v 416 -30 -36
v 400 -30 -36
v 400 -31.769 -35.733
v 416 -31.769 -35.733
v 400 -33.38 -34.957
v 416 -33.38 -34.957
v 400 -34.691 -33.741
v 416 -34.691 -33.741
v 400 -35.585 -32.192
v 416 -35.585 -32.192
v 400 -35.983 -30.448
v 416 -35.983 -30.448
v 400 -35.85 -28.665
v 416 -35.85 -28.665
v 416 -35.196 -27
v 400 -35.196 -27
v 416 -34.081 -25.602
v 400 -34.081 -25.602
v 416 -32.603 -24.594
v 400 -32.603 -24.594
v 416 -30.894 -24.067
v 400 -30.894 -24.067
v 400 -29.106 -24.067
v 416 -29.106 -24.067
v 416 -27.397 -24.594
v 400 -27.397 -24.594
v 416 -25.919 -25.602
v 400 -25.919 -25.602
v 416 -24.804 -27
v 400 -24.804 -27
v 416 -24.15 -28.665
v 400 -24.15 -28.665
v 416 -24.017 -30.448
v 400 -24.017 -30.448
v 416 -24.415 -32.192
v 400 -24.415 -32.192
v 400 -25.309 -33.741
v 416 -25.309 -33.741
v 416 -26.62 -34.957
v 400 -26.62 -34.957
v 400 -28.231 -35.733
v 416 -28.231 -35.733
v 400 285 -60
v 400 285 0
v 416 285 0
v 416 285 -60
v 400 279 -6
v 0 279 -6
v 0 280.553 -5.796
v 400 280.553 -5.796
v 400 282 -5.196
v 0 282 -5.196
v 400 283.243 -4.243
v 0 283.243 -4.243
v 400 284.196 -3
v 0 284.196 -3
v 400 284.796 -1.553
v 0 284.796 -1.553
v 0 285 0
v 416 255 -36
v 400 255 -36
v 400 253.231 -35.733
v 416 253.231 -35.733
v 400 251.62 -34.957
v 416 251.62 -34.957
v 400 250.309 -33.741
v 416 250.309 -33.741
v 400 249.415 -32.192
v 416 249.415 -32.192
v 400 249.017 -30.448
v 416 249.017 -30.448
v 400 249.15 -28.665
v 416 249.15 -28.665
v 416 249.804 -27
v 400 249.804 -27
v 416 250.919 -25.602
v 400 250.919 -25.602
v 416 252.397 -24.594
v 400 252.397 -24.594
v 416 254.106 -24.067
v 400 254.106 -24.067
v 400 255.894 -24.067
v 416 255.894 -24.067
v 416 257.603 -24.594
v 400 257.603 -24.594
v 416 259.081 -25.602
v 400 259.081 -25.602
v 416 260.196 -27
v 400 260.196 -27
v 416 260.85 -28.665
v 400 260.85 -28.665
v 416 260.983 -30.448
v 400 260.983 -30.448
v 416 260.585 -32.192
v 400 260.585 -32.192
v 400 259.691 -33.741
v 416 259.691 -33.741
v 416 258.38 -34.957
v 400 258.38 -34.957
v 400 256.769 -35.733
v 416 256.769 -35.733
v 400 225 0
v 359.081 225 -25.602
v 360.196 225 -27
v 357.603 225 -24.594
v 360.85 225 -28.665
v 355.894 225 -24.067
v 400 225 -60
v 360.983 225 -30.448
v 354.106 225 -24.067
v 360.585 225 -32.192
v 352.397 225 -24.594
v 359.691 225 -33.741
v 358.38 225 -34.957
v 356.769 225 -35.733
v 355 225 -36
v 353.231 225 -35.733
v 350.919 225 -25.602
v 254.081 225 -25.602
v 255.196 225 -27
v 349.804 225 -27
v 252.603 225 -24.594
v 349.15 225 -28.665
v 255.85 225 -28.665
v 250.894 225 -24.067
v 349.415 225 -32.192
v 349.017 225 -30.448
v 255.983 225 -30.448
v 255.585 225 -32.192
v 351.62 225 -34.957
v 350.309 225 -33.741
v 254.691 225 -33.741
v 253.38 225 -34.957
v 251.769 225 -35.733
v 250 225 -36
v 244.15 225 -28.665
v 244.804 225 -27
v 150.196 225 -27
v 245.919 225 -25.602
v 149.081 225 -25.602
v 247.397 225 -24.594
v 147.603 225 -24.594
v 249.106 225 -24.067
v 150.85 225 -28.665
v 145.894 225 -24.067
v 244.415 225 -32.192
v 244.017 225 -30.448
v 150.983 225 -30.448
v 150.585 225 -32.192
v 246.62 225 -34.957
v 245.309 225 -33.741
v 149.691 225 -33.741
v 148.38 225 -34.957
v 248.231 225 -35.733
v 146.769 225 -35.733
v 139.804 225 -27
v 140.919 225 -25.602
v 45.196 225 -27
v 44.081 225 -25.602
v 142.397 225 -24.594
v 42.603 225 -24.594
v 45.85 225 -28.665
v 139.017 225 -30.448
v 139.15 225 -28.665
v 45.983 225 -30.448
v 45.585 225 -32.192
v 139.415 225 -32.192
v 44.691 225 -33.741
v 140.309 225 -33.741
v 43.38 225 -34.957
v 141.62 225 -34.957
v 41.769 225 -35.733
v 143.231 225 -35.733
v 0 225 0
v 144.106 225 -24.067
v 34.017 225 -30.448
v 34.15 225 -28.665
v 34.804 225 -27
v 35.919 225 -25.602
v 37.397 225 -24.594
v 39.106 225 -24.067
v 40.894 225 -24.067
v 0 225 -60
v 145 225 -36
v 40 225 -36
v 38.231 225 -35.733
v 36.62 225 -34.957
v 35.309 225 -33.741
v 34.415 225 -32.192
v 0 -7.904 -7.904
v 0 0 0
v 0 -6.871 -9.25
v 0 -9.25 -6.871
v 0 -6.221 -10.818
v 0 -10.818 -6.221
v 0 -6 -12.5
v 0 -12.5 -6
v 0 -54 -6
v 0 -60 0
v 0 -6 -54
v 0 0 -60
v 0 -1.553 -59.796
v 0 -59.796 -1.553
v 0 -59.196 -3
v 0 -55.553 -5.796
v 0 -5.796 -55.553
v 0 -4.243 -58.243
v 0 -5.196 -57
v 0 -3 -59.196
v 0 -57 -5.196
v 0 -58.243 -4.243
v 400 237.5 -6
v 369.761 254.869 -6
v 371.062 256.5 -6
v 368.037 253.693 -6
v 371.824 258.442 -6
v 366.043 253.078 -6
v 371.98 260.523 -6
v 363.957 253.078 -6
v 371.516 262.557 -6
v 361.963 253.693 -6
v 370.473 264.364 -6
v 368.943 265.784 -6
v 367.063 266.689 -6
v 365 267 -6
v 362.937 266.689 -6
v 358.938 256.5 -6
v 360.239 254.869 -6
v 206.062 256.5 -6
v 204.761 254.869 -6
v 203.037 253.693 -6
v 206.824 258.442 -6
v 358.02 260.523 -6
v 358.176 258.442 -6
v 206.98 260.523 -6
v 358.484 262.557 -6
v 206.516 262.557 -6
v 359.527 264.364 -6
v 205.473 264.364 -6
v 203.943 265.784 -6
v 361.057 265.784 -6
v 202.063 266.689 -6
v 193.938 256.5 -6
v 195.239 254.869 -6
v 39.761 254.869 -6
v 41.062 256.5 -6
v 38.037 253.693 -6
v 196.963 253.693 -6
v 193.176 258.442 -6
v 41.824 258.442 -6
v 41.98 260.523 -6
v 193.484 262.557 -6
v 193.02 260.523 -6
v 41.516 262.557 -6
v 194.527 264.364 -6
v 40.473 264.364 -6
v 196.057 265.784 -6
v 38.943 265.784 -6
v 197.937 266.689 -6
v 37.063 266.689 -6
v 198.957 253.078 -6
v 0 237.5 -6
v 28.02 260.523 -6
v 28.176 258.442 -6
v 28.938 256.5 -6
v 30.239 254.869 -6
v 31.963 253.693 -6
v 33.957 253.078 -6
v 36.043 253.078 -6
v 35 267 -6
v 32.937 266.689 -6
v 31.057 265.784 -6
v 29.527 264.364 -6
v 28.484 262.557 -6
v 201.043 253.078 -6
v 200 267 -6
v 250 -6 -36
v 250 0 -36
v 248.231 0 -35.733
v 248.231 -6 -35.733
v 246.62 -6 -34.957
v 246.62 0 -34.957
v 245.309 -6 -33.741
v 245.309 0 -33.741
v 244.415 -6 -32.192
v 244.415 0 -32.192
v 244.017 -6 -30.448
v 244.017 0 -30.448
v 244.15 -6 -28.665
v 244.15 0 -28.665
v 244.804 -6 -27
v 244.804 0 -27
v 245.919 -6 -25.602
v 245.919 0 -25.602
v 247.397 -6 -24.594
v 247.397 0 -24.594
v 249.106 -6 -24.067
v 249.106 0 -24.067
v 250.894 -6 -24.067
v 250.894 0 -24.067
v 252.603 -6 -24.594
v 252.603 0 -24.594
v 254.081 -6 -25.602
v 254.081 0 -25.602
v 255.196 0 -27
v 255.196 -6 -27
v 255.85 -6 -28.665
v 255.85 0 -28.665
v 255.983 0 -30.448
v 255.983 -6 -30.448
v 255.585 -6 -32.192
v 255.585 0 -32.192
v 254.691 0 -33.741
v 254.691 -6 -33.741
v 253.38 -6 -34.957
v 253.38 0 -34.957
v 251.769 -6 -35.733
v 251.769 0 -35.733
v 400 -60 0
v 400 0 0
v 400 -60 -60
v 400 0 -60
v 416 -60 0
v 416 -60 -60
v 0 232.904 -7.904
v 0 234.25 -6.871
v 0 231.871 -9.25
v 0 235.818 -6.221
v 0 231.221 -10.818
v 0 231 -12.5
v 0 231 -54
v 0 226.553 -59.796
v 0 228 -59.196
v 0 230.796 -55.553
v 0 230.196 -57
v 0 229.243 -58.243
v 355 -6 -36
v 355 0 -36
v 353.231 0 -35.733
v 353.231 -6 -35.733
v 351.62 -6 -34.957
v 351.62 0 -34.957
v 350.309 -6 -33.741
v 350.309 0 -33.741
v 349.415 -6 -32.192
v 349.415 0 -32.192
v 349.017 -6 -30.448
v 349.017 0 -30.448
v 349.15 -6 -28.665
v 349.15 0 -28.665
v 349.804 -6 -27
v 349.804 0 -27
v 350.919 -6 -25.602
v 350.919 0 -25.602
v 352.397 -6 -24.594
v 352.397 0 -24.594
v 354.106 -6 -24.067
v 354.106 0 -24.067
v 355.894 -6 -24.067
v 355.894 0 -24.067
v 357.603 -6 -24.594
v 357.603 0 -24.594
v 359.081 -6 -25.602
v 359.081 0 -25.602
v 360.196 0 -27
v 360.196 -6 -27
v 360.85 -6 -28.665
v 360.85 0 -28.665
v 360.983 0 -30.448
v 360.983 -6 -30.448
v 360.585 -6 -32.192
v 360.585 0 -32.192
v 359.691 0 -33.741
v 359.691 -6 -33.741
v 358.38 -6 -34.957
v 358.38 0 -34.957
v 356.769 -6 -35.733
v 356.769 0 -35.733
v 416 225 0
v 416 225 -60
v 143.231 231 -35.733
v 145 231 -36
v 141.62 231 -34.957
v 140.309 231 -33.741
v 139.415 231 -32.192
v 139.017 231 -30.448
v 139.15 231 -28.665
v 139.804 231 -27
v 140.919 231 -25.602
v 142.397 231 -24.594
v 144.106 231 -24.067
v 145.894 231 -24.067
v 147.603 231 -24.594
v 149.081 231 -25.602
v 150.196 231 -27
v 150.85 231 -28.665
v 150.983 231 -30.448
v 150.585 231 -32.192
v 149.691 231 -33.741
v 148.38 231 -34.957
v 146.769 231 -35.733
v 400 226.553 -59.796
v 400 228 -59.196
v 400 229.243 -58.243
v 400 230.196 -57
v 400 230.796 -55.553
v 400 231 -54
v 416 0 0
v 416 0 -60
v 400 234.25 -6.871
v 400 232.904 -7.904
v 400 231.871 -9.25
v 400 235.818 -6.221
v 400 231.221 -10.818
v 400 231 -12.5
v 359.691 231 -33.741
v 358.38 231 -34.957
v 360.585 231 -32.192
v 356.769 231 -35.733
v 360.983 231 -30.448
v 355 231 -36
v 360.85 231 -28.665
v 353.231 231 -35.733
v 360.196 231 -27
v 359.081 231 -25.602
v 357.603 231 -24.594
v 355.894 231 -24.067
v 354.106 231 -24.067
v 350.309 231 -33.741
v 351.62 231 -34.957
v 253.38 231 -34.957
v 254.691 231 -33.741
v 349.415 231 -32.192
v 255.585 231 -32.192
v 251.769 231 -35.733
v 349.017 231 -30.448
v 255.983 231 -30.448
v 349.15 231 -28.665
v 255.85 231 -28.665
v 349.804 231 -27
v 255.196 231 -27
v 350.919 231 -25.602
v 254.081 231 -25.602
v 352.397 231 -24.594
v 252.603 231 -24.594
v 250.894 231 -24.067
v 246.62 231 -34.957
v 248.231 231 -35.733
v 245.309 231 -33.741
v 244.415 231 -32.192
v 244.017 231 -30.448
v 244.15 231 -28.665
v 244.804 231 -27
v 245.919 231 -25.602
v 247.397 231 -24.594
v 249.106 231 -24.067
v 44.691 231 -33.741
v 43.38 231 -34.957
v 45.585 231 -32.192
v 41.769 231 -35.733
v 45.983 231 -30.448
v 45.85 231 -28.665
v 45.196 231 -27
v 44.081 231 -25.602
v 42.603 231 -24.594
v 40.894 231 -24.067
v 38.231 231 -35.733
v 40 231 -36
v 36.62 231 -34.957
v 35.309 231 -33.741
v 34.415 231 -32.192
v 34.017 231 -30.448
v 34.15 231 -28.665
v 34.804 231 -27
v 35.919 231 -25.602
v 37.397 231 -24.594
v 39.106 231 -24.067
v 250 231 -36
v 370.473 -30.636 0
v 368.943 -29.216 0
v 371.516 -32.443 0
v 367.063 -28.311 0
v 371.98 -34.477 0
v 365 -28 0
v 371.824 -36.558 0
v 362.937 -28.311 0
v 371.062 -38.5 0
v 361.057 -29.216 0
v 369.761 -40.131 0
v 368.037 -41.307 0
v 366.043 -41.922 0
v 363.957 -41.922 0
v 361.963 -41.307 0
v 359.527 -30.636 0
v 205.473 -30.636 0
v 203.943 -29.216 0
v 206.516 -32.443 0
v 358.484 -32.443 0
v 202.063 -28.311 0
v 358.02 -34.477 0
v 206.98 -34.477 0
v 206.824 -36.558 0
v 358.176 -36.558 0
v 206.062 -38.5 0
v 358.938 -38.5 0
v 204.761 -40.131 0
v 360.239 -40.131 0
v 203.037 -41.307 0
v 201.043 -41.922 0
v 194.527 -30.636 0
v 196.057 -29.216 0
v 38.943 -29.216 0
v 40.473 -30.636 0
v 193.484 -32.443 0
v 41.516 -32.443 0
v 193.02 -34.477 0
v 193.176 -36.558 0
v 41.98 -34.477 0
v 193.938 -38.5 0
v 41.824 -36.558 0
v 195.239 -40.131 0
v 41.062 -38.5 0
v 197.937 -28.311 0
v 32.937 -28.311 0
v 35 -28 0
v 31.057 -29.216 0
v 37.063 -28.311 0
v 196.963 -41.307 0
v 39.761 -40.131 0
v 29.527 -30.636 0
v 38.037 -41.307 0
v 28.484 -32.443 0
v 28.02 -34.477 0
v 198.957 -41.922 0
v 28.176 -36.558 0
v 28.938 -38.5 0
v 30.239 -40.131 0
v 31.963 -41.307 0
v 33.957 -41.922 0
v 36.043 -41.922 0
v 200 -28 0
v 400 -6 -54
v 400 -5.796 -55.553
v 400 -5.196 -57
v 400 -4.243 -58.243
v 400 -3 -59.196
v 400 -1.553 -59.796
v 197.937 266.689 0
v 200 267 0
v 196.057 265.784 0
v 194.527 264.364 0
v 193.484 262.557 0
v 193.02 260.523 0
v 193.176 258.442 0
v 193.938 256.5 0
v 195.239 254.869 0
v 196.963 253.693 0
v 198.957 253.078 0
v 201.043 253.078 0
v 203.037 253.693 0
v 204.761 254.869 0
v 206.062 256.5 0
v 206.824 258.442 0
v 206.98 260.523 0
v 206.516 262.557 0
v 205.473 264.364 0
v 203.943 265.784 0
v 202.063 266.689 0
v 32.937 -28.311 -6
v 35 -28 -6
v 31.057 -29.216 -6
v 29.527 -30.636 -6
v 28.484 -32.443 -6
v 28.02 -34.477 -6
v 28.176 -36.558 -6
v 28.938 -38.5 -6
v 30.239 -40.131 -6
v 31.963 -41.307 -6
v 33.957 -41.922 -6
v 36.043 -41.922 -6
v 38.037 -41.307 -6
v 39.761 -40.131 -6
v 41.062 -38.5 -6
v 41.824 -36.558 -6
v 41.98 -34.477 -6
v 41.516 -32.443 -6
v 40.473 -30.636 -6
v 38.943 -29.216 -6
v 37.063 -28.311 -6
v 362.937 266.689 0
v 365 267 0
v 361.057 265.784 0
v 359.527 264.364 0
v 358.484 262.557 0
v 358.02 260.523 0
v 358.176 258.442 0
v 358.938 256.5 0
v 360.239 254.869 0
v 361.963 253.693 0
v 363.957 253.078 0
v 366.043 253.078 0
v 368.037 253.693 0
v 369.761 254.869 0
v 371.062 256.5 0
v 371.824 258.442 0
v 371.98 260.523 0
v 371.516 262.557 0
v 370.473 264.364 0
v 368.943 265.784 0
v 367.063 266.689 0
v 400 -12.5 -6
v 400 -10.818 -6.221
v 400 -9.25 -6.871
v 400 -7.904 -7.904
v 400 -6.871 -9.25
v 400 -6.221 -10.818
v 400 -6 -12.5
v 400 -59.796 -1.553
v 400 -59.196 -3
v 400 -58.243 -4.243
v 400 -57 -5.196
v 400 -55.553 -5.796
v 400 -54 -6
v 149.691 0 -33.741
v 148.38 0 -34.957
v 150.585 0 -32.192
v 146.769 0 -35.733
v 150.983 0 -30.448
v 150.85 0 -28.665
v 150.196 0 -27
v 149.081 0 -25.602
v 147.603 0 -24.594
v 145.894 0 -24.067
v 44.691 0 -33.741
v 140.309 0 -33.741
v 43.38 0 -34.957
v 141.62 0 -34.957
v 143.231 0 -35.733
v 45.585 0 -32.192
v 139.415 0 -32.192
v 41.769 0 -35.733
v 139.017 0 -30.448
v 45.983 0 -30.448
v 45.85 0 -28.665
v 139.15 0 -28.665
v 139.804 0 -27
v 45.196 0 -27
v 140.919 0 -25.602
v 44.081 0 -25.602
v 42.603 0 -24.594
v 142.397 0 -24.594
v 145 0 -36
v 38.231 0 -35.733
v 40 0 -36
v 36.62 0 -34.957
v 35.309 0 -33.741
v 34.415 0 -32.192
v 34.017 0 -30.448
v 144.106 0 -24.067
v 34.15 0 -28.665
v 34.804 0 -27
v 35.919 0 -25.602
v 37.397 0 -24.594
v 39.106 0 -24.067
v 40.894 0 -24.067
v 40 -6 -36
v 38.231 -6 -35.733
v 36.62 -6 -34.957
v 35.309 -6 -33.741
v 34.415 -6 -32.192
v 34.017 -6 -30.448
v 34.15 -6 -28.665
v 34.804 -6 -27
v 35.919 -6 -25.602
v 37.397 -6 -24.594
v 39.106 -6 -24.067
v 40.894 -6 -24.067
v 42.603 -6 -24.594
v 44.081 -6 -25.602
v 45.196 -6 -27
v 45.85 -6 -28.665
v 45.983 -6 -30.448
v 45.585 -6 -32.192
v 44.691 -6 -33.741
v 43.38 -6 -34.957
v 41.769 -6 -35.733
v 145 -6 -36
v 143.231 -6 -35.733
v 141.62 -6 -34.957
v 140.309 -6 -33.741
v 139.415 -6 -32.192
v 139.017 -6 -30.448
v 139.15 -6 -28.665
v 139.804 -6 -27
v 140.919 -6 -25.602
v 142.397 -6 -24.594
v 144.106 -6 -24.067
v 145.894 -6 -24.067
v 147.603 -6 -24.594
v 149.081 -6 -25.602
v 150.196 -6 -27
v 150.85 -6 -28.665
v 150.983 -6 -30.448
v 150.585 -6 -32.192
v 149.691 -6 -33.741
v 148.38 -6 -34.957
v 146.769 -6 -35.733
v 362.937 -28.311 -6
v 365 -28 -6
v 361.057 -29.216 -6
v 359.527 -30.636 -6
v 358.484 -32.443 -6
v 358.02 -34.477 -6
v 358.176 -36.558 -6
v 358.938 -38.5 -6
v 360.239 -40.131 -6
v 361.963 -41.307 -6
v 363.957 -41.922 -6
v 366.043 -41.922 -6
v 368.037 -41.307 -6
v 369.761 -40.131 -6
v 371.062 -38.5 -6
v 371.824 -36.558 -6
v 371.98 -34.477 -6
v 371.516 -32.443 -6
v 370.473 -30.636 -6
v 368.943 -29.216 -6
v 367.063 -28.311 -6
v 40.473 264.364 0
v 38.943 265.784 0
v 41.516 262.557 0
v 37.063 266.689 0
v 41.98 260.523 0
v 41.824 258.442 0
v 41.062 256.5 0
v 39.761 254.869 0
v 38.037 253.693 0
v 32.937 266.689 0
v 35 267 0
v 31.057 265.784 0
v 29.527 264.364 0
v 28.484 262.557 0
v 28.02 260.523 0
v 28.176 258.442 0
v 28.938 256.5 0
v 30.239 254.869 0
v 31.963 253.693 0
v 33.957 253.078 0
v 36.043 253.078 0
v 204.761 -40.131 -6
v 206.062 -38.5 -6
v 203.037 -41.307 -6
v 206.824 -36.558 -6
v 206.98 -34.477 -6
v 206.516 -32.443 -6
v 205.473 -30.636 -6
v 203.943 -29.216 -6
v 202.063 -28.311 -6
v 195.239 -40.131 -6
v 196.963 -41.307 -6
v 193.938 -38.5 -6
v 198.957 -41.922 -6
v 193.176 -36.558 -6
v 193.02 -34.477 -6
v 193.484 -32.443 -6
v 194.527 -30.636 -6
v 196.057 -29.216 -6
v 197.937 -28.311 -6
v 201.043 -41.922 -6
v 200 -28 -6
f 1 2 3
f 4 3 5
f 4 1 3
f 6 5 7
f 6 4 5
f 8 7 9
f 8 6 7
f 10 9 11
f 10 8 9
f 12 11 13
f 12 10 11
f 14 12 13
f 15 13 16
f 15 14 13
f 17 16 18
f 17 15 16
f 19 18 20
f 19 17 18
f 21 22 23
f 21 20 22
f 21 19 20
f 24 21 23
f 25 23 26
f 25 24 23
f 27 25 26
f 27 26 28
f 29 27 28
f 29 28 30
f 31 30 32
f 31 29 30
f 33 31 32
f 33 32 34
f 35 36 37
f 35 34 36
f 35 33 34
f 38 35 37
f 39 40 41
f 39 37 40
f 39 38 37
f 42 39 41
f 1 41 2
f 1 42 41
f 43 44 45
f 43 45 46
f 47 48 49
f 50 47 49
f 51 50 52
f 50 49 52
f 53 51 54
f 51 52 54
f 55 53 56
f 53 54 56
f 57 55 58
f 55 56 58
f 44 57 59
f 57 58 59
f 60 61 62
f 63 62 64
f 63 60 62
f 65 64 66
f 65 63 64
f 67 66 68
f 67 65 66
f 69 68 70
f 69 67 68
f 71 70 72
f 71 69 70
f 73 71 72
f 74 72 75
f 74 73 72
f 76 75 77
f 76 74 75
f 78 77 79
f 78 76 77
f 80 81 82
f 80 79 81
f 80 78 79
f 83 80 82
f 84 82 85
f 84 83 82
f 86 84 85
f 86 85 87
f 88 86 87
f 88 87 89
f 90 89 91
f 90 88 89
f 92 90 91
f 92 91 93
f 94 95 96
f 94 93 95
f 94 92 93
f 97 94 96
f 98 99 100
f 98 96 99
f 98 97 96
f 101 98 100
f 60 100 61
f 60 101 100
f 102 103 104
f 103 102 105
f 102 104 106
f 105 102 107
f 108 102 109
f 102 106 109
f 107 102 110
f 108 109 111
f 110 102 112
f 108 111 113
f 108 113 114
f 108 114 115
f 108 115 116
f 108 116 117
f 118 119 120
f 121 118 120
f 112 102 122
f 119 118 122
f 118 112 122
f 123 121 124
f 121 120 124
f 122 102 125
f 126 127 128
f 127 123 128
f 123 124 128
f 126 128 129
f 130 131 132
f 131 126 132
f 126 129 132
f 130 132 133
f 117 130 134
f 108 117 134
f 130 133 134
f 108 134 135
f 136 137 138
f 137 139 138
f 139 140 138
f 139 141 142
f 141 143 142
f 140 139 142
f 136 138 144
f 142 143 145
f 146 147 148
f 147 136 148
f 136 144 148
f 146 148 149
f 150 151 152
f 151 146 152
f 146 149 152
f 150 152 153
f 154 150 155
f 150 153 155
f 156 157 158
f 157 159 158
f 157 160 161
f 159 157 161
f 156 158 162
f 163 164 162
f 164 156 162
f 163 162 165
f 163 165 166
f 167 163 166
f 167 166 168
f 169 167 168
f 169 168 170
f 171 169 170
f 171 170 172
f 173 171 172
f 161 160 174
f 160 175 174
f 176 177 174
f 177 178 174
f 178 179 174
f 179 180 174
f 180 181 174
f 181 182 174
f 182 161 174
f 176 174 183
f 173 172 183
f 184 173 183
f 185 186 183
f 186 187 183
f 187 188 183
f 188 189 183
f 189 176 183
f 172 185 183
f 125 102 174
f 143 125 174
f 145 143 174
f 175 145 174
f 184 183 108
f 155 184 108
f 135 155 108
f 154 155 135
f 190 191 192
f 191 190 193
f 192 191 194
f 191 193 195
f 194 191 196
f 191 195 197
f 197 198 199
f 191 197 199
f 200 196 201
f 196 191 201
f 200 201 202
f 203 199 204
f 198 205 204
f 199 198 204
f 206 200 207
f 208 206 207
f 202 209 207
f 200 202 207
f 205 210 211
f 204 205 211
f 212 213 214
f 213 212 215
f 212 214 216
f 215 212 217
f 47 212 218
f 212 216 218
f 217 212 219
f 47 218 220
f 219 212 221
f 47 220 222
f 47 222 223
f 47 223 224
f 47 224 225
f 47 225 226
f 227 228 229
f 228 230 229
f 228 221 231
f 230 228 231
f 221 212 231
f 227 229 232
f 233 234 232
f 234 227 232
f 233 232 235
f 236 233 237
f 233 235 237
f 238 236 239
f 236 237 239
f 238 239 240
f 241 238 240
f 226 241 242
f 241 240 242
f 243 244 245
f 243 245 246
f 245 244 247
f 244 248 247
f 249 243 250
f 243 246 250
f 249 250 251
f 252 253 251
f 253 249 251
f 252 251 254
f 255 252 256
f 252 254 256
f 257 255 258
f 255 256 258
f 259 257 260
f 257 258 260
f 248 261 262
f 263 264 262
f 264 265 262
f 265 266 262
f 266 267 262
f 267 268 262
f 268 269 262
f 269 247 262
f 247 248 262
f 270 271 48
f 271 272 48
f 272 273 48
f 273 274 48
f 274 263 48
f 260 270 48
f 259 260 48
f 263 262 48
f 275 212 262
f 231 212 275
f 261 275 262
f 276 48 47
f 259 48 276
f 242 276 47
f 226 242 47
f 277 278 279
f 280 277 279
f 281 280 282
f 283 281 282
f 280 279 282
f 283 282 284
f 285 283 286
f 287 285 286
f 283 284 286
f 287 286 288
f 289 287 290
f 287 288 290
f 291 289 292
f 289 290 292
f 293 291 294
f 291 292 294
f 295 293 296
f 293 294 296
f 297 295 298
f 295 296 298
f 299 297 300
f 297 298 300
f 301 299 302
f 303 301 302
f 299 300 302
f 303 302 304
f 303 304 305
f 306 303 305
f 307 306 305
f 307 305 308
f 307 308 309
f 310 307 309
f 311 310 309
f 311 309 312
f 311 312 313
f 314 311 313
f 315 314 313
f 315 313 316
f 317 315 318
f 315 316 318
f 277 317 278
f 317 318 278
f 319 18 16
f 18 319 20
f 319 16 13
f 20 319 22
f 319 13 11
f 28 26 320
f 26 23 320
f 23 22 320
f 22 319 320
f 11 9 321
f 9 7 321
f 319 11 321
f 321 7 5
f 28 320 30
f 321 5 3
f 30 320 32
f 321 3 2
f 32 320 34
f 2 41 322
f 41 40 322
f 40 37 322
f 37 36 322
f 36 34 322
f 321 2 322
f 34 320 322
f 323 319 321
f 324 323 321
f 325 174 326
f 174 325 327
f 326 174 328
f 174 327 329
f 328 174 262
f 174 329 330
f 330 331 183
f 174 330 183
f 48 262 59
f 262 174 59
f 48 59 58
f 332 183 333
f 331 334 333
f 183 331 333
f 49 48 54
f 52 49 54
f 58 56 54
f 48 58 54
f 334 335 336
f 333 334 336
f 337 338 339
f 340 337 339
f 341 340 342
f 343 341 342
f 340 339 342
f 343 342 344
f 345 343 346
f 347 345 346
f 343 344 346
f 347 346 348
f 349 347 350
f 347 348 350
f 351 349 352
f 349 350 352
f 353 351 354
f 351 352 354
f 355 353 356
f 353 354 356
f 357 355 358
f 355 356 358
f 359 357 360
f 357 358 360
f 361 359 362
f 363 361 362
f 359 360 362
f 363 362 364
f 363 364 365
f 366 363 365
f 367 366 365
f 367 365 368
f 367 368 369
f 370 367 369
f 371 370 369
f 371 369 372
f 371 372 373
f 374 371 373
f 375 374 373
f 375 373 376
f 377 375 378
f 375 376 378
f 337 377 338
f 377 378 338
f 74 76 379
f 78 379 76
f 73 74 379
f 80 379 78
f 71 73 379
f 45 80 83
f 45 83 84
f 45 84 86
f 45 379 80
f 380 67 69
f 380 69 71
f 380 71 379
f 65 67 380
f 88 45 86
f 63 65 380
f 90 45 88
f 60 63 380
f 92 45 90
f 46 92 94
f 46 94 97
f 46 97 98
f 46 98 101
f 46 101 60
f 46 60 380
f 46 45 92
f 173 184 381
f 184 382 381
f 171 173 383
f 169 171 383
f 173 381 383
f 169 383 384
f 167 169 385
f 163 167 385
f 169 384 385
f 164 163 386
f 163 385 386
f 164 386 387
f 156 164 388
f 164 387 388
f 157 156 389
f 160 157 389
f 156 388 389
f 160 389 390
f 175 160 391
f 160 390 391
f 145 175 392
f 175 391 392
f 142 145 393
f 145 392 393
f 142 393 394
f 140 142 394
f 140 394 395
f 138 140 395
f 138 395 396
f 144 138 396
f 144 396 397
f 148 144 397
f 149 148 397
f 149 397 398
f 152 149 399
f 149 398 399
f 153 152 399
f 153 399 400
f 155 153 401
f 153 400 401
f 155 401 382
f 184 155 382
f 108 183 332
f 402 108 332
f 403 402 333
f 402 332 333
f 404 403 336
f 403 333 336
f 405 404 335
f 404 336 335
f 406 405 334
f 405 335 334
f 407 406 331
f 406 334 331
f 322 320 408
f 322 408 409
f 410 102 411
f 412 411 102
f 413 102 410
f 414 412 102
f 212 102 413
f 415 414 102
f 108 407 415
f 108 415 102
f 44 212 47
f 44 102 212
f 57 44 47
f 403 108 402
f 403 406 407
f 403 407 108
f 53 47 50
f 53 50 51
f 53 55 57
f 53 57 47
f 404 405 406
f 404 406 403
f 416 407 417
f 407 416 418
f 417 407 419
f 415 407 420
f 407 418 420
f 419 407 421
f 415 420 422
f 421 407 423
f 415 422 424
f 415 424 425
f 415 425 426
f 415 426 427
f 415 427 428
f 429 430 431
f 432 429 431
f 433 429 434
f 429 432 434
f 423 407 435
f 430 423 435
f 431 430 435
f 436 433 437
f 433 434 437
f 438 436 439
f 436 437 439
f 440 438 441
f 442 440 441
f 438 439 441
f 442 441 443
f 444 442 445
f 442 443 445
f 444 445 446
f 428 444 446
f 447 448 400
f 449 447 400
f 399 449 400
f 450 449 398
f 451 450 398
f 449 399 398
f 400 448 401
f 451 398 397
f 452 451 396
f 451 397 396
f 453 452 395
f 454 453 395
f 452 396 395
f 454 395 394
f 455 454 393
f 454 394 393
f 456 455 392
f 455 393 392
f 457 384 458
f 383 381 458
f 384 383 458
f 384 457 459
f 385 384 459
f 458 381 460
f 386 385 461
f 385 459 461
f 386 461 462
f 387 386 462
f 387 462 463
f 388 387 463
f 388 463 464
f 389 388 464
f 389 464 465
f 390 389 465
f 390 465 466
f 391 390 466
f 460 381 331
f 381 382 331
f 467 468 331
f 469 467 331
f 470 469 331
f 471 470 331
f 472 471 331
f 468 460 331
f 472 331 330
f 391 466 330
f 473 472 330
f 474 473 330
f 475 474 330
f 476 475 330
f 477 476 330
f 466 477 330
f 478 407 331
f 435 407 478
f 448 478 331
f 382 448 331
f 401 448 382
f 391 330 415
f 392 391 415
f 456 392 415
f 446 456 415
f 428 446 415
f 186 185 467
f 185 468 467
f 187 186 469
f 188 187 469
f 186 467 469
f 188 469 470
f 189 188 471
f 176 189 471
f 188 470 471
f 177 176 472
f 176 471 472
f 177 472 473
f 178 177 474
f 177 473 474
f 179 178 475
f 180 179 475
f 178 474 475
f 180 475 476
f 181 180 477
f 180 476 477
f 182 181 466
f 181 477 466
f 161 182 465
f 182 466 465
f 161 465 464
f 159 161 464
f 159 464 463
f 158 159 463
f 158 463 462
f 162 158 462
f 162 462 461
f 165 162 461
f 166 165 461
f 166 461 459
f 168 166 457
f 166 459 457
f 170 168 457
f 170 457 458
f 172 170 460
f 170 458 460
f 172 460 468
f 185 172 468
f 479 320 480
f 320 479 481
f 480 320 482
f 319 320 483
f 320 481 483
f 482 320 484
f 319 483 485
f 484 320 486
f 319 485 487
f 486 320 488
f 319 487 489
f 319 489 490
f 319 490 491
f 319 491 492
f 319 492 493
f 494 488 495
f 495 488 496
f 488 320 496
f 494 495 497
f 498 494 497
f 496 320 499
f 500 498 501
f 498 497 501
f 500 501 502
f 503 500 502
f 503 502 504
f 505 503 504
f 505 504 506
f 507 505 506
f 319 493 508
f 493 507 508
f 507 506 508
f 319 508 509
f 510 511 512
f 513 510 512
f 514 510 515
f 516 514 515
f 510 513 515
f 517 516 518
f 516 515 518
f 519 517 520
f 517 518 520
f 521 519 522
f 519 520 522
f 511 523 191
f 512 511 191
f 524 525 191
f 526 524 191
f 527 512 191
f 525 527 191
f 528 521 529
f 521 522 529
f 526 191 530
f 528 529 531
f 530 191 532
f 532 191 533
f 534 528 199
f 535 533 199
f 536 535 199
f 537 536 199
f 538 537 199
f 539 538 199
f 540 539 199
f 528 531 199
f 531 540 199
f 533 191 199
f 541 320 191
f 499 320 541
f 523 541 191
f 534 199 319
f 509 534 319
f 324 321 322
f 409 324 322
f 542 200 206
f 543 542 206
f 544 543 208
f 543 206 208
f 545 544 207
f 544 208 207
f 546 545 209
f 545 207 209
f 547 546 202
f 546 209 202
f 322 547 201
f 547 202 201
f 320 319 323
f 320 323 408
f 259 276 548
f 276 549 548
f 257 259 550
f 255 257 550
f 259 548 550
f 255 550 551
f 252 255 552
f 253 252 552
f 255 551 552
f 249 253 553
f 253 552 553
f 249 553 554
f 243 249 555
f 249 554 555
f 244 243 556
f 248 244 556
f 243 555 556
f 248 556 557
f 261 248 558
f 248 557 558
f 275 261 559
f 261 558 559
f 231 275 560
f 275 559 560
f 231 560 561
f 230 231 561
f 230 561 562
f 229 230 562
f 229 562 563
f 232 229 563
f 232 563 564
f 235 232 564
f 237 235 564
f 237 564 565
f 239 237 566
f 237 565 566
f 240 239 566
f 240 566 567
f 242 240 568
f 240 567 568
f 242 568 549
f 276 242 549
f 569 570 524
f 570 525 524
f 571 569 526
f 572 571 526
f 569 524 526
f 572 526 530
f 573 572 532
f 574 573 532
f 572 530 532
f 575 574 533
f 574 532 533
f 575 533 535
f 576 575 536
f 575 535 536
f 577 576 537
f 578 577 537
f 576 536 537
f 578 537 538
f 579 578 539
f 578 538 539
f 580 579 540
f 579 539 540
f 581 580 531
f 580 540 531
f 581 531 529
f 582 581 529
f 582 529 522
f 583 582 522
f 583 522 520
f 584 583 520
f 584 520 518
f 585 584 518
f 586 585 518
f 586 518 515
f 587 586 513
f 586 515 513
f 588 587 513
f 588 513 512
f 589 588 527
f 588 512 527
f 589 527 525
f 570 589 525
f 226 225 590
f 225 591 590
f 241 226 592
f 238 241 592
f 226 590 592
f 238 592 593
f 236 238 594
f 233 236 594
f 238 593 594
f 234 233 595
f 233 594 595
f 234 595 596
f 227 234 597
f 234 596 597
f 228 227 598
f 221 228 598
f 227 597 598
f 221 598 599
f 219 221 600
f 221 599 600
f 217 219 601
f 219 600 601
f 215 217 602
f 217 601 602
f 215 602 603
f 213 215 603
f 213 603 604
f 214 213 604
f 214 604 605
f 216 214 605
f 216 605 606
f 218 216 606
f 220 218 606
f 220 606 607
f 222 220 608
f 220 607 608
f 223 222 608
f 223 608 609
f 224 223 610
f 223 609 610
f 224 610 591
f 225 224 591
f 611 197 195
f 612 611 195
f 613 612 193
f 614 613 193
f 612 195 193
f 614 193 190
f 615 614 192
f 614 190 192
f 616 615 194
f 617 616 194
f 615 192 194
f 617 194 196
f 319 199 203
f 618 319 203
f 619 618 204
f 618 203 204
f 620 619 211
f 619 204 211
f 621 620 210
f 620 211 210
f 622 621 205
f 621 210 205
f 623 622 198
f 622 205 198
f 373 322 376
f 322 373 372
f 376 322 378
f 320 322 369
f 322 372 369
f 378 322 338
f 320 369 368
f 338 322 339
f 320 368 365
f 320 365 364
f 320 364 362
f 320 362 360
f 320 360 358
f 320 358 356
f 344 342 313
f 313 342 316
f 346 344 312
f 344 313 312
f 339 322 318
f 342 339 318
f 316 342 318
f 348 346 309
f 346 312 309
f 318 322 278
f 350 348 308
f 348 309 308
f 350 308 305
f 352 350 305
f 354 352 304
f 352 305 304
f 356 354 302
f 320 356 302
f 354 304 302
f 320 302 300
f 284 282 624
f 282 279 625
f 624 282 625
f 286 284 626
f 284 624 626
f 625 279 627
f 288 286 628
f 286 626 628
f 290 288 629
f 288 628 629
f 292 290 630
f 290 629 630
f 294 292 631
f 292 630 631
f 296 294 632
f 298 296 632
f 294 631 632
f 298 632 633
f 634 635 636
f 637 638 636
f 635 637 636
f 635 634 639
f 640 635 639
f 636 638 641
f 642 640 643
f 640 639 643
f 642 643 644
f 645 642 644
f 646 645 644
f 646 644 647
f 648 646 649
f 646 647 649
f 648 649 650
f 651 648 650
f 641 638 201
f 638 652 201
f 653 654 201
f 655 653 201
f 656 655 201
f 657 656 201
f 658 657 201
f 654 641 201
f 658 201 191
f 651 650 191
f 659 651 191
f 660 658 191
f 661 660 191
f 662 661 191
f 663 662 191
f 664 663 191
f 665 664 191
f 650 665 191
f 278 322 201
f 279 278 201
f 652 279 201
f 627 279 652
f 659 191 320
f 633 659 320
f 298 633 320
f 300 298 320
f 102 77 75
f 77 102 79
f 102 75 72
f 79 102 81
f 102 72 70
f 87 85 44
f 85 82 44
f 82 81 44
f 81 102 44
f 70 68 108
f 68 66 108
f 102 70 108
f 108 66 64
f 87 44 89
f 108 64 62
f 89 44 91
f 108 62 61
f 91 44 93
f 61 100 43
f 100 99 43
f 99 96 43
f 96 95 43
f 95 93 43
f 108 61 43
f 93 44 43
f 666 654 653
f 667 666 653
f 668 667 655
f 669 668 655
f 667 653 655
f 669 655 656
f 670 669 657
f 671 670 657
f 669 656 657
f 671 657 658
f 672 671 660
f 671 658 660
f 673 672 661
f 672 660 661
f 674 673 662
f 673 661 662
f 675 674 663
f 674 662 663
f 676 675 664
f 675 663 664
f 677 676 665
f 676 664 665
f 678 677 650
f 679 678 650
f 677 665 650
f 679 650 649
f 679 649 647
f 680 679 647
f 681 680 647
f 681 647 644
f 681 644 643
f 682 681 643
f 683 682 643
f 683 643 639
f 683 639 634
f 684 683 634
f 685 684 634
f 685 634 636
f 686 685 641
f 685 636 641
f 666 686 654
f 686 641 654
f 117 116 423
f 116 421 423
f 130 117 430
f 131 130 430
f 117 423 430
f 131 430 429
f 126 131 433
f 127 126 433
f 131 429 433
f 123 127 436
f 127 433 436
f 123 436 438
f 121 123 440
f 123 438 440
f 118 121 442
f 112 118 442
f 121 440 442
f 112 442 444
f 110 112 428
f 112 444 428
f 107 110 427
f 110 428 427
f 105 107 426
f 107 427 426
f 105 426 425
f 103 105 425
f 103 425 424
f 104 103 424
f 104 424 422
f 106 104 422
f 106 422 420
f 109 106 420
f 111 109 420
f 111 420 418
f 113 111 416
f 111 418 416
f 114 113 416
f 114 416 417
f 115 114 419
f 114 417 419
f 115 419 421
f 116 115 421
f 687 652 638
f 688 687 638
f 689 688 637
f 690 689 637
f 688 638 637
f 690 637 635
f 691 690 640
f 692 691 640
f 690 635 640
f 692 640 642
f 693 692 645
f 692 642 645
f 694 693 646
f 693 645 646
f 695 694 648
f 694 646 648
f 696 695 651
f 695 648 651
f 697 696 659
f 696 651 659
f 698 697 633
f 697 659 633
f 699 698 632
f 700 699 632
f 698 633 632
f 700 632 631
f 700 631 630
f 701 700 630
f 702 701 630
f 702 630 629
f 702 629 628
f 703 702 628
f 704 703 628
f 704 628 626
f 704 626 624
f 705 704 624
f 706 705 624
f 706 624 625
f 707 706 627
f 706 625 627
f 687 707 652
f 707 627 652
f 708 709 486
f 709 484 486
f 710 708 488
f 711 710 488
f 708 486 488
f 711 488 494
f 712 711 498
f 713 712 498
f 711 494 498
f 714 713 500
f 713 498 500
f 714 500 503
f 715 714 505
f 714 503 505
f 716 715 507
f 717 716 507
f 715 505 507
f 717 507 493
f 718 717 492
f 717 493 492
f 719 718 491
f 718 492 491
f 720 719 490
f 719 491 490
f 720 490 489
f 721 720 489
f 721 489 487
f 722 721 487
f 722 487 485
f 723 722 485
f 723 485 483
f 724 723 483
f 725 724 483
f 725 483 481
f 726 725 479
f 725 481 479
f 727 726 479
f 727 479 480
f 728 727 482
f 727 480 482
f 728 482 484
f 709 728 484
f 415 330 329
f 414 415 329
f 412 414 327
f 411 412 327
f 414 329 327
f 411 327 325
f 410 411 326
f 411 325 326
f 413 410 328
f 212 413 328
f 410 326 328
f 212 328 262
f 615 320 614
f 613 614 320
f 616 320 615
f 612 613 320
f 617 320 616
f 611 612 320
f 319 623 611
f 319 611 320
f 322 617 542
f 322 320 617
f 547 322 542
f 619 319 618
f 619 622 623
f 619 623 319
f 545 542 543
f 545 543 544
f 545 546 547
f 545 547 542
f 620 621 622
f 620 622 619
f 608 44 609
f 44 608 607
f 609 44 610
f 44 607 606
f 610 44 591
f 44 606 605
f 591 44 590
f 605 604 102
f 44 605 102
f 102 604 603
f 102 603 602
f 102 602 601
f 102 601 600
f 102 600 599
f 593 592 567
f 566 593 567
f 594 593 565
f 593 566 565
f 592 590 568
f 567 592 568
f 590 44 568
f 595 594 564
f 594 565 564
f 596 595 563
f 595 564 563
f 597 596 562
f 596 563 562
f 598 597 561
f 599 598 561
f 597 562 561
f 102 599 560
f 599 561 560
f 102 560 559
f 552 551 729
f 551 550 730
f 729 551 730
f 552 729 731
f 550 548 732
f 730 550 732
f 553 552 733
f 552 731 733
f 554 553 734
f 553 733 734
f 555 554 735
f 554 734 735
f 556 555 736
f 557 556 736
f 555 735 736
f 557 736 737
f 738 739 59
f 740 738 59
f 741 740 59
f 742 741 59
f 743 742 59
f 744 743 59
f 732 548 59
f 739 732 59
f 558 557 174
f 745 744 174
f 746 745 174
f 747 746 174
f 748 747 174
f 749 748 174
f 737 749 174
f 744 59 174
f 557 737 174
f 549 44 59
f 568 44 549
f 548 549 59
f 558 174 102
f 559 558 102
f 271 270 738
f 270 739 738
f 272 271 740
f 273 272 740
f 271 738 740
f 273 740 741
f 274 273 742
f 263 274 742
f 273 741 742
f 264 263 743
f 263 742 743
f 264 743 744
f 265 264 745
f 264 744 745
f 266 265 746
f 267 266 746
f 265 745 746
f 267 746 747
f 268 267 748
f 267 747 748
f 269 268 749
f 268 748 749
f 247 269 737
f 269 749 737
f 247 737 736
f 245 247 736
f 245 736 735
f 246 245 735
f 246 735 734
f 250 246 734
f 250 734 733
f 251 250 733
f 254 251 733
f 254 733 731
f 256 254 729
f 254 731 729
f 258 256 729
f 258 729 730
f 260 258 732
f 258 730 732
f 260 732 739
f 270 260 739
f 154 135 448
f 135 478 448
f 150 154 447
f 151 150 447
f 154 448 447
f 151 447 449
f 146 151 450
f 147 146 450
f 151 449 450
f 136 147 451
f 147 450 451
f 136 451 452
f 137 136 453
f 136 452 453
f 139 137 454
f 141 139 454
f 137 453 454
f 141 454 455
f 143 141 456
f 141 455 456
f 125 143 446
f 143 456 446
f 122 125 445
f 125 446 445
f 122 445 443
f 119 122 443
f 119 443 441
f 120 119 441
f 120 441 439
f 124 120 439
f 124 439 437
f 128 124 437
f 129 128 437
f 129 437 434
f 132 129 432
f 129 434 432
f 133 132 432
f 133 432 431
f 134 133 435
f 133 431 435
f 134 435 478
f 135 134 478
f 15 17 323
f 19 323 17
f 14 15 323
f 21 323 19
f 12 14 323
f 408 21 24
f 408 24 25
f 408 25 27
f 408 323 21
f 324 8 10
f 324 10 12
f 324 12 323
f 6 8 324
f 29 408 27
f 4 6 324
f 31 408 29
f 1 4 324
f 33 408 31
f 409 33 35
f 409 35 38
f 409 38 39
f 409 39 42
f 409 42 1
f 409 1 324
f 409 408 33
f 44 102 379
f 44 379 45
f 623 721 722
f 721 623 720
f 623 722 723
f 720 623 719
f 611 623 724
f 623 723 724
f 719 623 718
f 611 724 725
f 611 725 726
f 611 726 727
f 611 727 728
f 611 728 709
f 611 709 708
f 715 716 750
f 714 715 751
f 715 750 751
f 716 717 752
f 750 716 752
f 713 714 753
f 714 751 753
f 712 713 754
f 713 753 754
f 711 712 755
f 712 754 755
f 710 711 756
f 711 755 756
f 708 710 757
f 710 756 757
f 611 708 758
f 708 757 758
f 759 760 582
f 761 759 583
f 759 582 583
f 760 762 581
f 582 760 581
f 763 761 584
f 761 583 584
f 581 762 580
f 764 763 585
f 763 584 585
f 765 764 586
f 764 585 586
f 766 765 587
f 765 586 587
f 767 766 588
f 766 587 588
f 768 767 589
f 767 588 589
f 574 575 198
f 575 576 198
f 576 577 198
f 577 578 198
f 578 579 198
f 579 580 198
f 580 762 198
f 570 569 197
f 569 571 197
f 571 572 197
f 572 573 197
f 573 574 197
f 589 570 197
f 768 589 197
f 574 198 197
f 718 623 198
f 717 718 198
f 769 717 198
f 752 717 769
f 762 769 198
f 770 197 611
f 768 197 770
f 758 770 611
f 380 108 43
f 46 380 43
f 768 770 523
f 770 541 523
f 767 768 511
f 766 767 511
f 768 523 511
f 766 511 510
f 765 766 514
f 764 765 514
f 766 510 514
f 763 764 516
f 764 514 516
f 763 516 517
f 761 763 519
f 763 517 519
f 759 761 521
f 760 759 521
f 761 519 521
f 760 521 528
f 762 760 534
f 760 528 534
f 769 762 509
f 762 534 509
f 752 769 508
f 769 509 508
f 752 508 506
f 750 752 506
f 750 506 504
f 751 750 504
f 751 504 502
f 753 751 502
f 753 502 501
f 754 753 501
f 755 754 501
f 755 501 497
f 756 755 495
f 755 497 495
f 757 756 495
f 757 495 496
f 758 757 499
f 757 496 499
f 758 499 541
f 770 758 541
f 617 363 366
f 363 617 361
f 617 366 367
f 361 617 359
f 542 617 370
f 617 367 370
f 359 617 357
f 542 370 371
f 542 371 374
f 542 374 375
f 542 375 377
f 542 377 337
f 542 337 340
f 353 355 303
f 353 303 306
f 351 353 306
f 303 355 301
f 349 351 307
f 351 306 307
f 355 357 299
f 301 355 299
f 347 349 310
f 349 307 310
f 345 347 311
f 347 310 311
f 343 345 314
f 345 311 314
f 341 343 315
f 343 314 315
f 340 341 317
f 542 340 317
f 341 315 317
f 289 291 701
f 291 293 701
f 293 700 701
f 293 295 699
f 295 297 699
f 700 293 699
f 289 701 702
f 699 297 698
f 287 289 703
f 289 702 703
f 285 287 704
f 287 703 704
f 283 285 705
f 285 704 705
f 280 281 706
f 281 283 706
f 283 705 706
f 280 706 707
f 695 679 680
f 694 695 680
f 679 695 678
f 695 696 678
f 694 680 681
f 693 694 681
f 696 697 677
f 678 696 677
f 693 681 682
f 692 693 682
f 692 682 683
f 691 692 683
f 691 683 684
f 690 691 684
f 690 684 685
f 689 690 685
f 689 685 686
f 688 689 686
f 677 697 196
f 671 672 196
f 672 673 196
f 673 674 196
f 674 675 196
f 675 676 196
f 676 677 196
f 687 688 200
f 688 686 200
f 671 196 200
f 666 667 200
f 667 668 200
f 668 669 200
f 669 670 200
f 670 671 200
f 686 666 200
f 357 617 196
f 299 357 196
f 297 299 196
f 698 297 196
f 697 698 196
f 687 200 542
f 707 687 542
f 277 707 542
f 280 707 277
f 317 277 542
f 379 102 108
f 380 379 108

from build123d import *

# Parameters (mm, degrees)
GBT_706_2008_60_60_6_1_DEPTH     = 400
GBT_706_2008_60_60_6_2_DEPTH     = 400
GBT_706_2008_60_60_6_3_DEPTH     = 225
SKETCH_8_W                       = 60
SKETCH_8_H                       = 60
EXTRUDE_2_DEPTH                  = 16
EXTRUDE_2_2_DEPTH                = 16
HOLE_WIZARD_M14_2_AT_2_COUNT     = 2
HOLE_WIZARD_M14_2_AT_2_PITCH     = 285
SKETCH_12_W                      = 6
SKETCH_12_H                      = 291
HOLE_WIZARD_12_0_12_1_AT_2_COUNT = 2
HOLE_WIZARD_12_0_12_1_AT_2_PITCH = 105
HOLE_WIZARD_12_0_12_1_AT_3_COUNT = 2
HOLE_WIZARD_12_0_12_1_AT_3_PITCH = 210
HOLE_WIZARD_12_0_12_1_AT_4_COUNT = 2
HOLE_WIZARD_12_0_12_1_AT_4_PITCH = 315
SKETCH_14_W                      = 7
SKETCH_14_H                      = 6
HOLE_WIZARD_14_0_14_1_AT_2_COUNT = 2
HOLE_WIZARD_14_0_14_1_AT_2_PITCH = 165
HOLE_WIZARD_14_0_14_1_AT_3_COUNT = 2
HOLE_WIZARD_14_0_14_1_AT_3_PITCH = 330
HOLE_WIZARD_14_0_14_1_AT_4_COUNT = 2
HOLE_WIZARD_14_0_14_1_AT_4_PITCH = 295
HOLE_WIZARD_14_0_14_1_AT_5_COUNT = 2
HOLE_WIZARD_14_0_14_1_AT_5_PITCH = 338.008875623
HOLE_WIZARD_14_0_14_1_AT_6_COUNT = 2
HOLE_WIZARD_14_0_14_1_AT_6_PITCH = 442.634160453
HOLE_WIZARD_14_0_14_1_AT_7_COUNT = 2
HOLE_WIZARD_14_0_14_1_AT_7_PITCH = 406.970514902
HOLE_WIZARD_14_0_14_1_AT_8_COUNT = 2
HOLE_WIZARD_14_0_14_1_AT_8_PITCH = 456.508488421
SKETCH_15_W                      = 60
SKETCH_15_H                      = 225
CUT_EXTRUDE_1_DEPTH              = 100


with BuildPart() as part:
    # Sketch13 → Gbt 706-2008 热轧型钢_等边角钢 60×60×6(1) (new body)
    with BuildSketch(Plane(origin=(0, 225, 0), x_dir=(0, 0, -1), z_dir=(1, 0, 0))):
        with BuildLine():
            Line((0, 60), (0, 0))
            Line((0, 0), (60, 0))
            ThreePointArc((60, 0), (58.242640687, 4.242640687), (54, 6))
            Line((54, 6), (12.5, 6))
            ThreePointArc((12.5, 6), (7.903805922, 7.903805922), (6, 12.5))
            Line((6, 12.5), (6, 54))
            ThreePointArc((6, 54), (4.242640687, 58.242640687), (0, 60))
        make_face()
    extrude(amount=GBT_706_2008_60_60_6_1_DEPTH)


with BuildPart() as body_2:
    # Sketch1 → Gbt 706-2008 热轧型钢_等边角钢 60×60×6(2) (new body)
    with BuildSketch(Plane(origin=(0, 0, 0), x_dir=(0, -1, 0), z_dir=(1, 0, 0))):
        with BuildLine():
            Line((0, 60), (0, 0))
            Line((0, 0), (60, 0))
            ThreePointArc((60, 0), (58.242640687, 4.242640687), (54, 6))
            Line((54, 6), (12.5, 6))
            ThreePointArc((12.5, 6), (7.903805922, 7.903805922), (6, 12.5))
            Line((6, 12.5), (6, 54))
            ThreePointArc((6, 54), (4.242640687, 58.242640687), (0, 60))
        make_face()
    extrude(amount=GBT_706_2008_60_60_6_2_DEPTH)


with BuildPart() as body_3:
    # Sketch14 → Gbt 706-2008 热轧型钢_等边角钢 60×60×6(3) (new body)
    with BuildSketch(Plane(origin=(0, 225, 0), x_dir=(-1, 0, 0), z_dir=(0, -1, 0))):
        with BuildLine():
            Line((0, 60), (0, 0))
            Line((0, 0), (60, 0))
            ThreePointArc((60, 0), (58.242640687, 4.242640687), (54, 6))
            Line((54, 6), (12.5, 6))
            ThreePointArc((12.5, 6), (7.903805922, 7.903805922), (6, 12.5))
            Line((6, 12.5), (6, 54))
            ThreePointArc((6, 54), (4.242640687, 58.242640687), (0, 60))
        make_face()
    extrude(amount=GBT_706_2008_60_60_6_3_DEPTH)


with BuildPart() as body_4:
    # 草图8 → 凸台-拉伸2 (new body)
    with BuildSketch(Plane(origin=(400, 0, 0), x_dir=(0, 0, -1), z_dir=(1, 0, 0))):
        with Locations((30, 255)):
            Rectangle(SKETCH_8_W, SKETCH_8_H)
    extrude(amount=EXTRUDE_2_DEPTH)

    # 草图10 → M14 螺纹孔2 (revolve, cut)
    with BuildSketch(Plane(origin=(416, 255, -30), x_dir=(0, 0, -1), z_dir=(0, 1, 0))):
        Polygon((0, 0), (0, 41.605163714), (6, 38), (6, 0), align=None)
    hole_wizard_m14_2 = revolve(axis=Axis((422.35, 255, -30), (-1, 0, 0)), mode=Mode.SUBTRACT)


with BuildPart() as body_5:
    # 草图8 → Extrude 2 2 (new body)
    with BuildSketch(Plane(origin=(400, 0, 0), x_dir=(0, 0, -1), z_dir=(1, 0, 0))):
        with Locations((30, -30)):
            Rectangle(SKETCH_8_W, SKETCH_8_H)
    extrude(amount=EXTRUDE_2_2_DEPTH)

    # M14 螺纹孔2 at 2: M14 螺纹孔2 ×2
    with Locations(*[(0, -i * HOLE_WIZARD_M14_2_AT_2_PITCH, 0) for i in range(1, HOLE_WIZARD_M14_2_AT_2_COUNT)]):
        add(hole_wizard_m14_2, mode=Mode.SUBTRACT)


with BuildPart() as hole_wizard_12_0_12_1_tool:
    # 草图12 → Ø12.0 (12) 直径孔1 (revolve)
    with BuildSketch(Plane(origin=(355, -6, -30), x_dir=(0, 0, -1), z_dir=(1, 0, 0))):
        with Locations((3, 145.5)):
            Rectangle(SKETCH_12_W, SKETCH_12_H)
    hole_wizard_12_0_12_1 = revolve(axis=Axis((355, -12.35, -30), (0, 1, 0)))


with BuildPart() as part_1:
    add(part.part)

    # Ø12.0 (12) 直径孔1: cut by hole_wizard_12_0_12_1_tool
    add(hole_wizard_12_0_12_1_tool.part, mode=Mode.SUBTRACT)


with BuildPart() as body_2_1:
    add(body_2.part)

    # Ø12.0 (12) 直径孔1: cut by hole_wizard_12_0_12_1_tool
    add(hole_wizard_12_0_12_1_tool.part, mode=Mode.SUBTRACT)


with BuildPart() as hole_wizard_12_0_12_1_at_2_tool:
    # Ø12.0 (12) 直径孔1 at 2: Ø12.0 (12) 直径孔1 ×2
    with Locations(*[(-i * HOLE_WIZARD_12_0_12_1_AT_2_PITCH, 0, 0) for i in range(1, HOLE_WIZARD_12_0_12_1_AT_2_COUNT)]):
        add(hole_wizard_12_0_12_1)


with BuildPart() as part_2:
    add(part_1.part)

    # Ø12.0 (12) 直径孔1 at 2: cut by hole_wizard_12_0_12_1_at_2_tool
    add(hole_wizard_12_0_12_1_at_2_tool.part, mode=Mode.SUBTRACT)


with BuildPart() as body_2_2:
    add(body_2_1.part)

    # Ø12.0 (12) 直径孔1 at 2: cut by hole_wizard_12_0_12_1_at_2_tool
    add(hole_wizard_12_0_12_1_at_2_tool.part, mode=Mode.SUBTRACT)


with BuildPart() as hole_wizard_12_0_12_1_at_3_tool:
    # Ø12.0 (12) 直径孔1 at 3: Ø12.0 (12) 直径孔1 ×2
    with Locations(*[(-i * HOLE_WIZARD_12_0_12_1_AT_3_PITCH, 0, 0) for i in range(1, HOLE_WIZARD_12_0_12_1_AT_3_COUNT)]):
        add(hole_wizard_12_0_12_1)


with BuildPart() as part_3:
    add(part_2.part)

    # Ø12.0 (12) 直径孔1 at 3: cut by hole_wizard_12_0_12_1_at_3_tool
    add(hole_wizard_12_0_12_1_at_3_tool.part, mode=Mode.SUBTRACT)


with BuildPart() as body_2_3:
    add(body_2_2.part)

    # Ø12.0 (12) 直径孔1 at 3: cut by hole_wizard_12_0_12_1_at_3_tool
    add(hole_wizard_12_0_12_1_at_3_tool.part, mode=Mode.SUBTRACT)


with BuildPart() as hole_wizard_12_0_12_1_at_4_tool:
    # Ø12.0 (12) 直径孔1 at 4: Ø12.0 (12) 直径孔1 ×2
    with Locations(*[(-i * HOLE_WIZARD_12_0_12_1_AT_4_PITCH, 0, 0) for i in range(1, HOLE_WIZARD_12_0_12_1_AT_4_COUNT)]):
        add(hole_wizard_12_0_12_1)


with BuildPart() as part_4:
    add(part_3.part)

    # Ø12.0 (12) 直径孔1 at 4: cut by hole_wizard_12_0_12_1_at_4_tool
    add(hole_wizard_12_0_12_1_at_4_tool.part, mode=Mode.SUBTRACT)

    # 草图14 → Ø14.0 (14) 直径孔1 (revolve, cut)
    with BuildSketch(Plane(origin=(365, 260, -6), x_dir=(0, 1, 0), z_dir=(1, 0, 0))):
        with Locations((3.5, 3)):
            Rectangle(SKETCH_14_W, SKETCH_14_H)
    hole_wizard_14_0_14_1 = revolve(axis=Axis((365, 260, -12.35), (0, 0, 1)), mode=Mode.SUBTRACT)

    # Ø14.0 (14) 直径孔1 at 2: Ø14.0 (14) 直径孔1 ×2
    with Locations(*[(-i * HOLE_WIZARD_14_0_14_1_AT_2_PITCH, 0, 0) for i in range(1, HOLE_WIZARD_14_0_14_1_AT_2_COUNT)]):
        add(hole_wizard_14_0_14_1, mode=Mode.SUBTRACT)

    # Ø14.0 (14) 直径孔1 at 3: Ø14.0 (14) 直径孔1 ×2
    with Locations(*[(-i * HOLE_WIZARD_14_0_14_1_AT_3_PITCH, 0, 0) for i in range(1, HOLE_WIZARD_14_0_14_1_AT_3_COUNT)]):
        add(hole_wizard_14_0_14_1, mode=Mode.SUBTRACT)


with BuildPart() as body_2_4:
    add(body_2_3.part)

    # Ø12.0 (12) 直径孔1 at 4: cut by hole_wizard_12_0_12_1_at_4_tool
    add(hole_wizard_12_0_12_1_at_4_tool.part, mode=Mode.SUBTRACT)

    # Ø14.0 (14) 直径孔1 at 4: Ø14.0 (14) 直径孔1 ×2
    with Locations(*[(0, -i * HOLE_WIZARD_14_0_14_1_AT_4_PITCH, 0) for i in range(1, HOLE_WIZARD_14_0_14_1_AT_4_COUNT)]):
        add(hole_wizard_14_0_14_1, mode=Mode.SUBTRACT)

    # Ø14.0 (14) 直径孔1 at 5: Ø14.0 (14) 直径孔1 ×2
    with Locations(*[Vector(-0.48815286195022645, -0.8727581471231325, 0) * (i * HOLE_WIZARD_14_0_14_1_AT_5_PITCH) for i in range(1, HOLE_WIZARD_14_0_14_1_AT_5_COUNT)]):
        add(hole_wizard_14_0_14_1, mode=Mode.SUBTRACT)

    # Ø14.0 (14) 直径孔1 at 6: Ø14.0 (14) 直径孔1 ×2
    with Locations(*[Vector(-0.7455366744903166, -0.6664646029534651, 0) * (i * HOLE_WIZARD_14_0_14_1_AT_6_PITCH) for i in range(1, HOLE_WIZARD_14_0_14_1_AT_6_COUNT)]):
        add(hole_wizard_14_0_14_1, mode=Mode.SUBTRACT)


with BuildPart() as body_3_1:
    add(body_3.part)

    # Ø14.0 (14) 直径孔1 at 7: Ø14.0 (14) 直径孔1 ×2
    with Locations(*[Vector(-0.9828721869343219, -0.1842885350501855, 0) * (i * HOLE_WIZARD_14_0_14_1_AT_7_PITCH) for i in range(1, HOLE_WIZARD_14_0_14_1_AT_7_COUNT)]):
        add(hole_wizard_14_0_14_1, mode=Mode.SUBTRACT)

    # Ø14.0 (14) 直径孔1 at 8: Ø14.0 (14) 直径孔1 ×2
    with Locations(*[Vector(-0.876215908676647, -0.48191874977215593, 0) * (i * HOLE_WIZARD_14_0_14_1_AT_8_PITCH) for i in range(1, HOLE_WIZARD_14_0_14_1_AT_8_COUNT)]):
        add(hole_wizard_14_0_14_1, mode=Mode.SUBTRACT)

    # 草图15 → 切除-拉伸1 (cut)
    with BuildSketch(Plane(origin=(0, 0, 0), x_dir=(0, 0, -1), z_dir=(1, 0, 0))):
        with Locations((30, 112.5)):
            Rectangle(SKETCH_15_W, SKETCH_15_H)
    extrude(amount=-CUT_EXTRUDE_1_DEPTH, mode=Mode.SUBTRACT)


solid = Compound([body_4.part, body_5.part, part_4.part, body_2_4.part])
